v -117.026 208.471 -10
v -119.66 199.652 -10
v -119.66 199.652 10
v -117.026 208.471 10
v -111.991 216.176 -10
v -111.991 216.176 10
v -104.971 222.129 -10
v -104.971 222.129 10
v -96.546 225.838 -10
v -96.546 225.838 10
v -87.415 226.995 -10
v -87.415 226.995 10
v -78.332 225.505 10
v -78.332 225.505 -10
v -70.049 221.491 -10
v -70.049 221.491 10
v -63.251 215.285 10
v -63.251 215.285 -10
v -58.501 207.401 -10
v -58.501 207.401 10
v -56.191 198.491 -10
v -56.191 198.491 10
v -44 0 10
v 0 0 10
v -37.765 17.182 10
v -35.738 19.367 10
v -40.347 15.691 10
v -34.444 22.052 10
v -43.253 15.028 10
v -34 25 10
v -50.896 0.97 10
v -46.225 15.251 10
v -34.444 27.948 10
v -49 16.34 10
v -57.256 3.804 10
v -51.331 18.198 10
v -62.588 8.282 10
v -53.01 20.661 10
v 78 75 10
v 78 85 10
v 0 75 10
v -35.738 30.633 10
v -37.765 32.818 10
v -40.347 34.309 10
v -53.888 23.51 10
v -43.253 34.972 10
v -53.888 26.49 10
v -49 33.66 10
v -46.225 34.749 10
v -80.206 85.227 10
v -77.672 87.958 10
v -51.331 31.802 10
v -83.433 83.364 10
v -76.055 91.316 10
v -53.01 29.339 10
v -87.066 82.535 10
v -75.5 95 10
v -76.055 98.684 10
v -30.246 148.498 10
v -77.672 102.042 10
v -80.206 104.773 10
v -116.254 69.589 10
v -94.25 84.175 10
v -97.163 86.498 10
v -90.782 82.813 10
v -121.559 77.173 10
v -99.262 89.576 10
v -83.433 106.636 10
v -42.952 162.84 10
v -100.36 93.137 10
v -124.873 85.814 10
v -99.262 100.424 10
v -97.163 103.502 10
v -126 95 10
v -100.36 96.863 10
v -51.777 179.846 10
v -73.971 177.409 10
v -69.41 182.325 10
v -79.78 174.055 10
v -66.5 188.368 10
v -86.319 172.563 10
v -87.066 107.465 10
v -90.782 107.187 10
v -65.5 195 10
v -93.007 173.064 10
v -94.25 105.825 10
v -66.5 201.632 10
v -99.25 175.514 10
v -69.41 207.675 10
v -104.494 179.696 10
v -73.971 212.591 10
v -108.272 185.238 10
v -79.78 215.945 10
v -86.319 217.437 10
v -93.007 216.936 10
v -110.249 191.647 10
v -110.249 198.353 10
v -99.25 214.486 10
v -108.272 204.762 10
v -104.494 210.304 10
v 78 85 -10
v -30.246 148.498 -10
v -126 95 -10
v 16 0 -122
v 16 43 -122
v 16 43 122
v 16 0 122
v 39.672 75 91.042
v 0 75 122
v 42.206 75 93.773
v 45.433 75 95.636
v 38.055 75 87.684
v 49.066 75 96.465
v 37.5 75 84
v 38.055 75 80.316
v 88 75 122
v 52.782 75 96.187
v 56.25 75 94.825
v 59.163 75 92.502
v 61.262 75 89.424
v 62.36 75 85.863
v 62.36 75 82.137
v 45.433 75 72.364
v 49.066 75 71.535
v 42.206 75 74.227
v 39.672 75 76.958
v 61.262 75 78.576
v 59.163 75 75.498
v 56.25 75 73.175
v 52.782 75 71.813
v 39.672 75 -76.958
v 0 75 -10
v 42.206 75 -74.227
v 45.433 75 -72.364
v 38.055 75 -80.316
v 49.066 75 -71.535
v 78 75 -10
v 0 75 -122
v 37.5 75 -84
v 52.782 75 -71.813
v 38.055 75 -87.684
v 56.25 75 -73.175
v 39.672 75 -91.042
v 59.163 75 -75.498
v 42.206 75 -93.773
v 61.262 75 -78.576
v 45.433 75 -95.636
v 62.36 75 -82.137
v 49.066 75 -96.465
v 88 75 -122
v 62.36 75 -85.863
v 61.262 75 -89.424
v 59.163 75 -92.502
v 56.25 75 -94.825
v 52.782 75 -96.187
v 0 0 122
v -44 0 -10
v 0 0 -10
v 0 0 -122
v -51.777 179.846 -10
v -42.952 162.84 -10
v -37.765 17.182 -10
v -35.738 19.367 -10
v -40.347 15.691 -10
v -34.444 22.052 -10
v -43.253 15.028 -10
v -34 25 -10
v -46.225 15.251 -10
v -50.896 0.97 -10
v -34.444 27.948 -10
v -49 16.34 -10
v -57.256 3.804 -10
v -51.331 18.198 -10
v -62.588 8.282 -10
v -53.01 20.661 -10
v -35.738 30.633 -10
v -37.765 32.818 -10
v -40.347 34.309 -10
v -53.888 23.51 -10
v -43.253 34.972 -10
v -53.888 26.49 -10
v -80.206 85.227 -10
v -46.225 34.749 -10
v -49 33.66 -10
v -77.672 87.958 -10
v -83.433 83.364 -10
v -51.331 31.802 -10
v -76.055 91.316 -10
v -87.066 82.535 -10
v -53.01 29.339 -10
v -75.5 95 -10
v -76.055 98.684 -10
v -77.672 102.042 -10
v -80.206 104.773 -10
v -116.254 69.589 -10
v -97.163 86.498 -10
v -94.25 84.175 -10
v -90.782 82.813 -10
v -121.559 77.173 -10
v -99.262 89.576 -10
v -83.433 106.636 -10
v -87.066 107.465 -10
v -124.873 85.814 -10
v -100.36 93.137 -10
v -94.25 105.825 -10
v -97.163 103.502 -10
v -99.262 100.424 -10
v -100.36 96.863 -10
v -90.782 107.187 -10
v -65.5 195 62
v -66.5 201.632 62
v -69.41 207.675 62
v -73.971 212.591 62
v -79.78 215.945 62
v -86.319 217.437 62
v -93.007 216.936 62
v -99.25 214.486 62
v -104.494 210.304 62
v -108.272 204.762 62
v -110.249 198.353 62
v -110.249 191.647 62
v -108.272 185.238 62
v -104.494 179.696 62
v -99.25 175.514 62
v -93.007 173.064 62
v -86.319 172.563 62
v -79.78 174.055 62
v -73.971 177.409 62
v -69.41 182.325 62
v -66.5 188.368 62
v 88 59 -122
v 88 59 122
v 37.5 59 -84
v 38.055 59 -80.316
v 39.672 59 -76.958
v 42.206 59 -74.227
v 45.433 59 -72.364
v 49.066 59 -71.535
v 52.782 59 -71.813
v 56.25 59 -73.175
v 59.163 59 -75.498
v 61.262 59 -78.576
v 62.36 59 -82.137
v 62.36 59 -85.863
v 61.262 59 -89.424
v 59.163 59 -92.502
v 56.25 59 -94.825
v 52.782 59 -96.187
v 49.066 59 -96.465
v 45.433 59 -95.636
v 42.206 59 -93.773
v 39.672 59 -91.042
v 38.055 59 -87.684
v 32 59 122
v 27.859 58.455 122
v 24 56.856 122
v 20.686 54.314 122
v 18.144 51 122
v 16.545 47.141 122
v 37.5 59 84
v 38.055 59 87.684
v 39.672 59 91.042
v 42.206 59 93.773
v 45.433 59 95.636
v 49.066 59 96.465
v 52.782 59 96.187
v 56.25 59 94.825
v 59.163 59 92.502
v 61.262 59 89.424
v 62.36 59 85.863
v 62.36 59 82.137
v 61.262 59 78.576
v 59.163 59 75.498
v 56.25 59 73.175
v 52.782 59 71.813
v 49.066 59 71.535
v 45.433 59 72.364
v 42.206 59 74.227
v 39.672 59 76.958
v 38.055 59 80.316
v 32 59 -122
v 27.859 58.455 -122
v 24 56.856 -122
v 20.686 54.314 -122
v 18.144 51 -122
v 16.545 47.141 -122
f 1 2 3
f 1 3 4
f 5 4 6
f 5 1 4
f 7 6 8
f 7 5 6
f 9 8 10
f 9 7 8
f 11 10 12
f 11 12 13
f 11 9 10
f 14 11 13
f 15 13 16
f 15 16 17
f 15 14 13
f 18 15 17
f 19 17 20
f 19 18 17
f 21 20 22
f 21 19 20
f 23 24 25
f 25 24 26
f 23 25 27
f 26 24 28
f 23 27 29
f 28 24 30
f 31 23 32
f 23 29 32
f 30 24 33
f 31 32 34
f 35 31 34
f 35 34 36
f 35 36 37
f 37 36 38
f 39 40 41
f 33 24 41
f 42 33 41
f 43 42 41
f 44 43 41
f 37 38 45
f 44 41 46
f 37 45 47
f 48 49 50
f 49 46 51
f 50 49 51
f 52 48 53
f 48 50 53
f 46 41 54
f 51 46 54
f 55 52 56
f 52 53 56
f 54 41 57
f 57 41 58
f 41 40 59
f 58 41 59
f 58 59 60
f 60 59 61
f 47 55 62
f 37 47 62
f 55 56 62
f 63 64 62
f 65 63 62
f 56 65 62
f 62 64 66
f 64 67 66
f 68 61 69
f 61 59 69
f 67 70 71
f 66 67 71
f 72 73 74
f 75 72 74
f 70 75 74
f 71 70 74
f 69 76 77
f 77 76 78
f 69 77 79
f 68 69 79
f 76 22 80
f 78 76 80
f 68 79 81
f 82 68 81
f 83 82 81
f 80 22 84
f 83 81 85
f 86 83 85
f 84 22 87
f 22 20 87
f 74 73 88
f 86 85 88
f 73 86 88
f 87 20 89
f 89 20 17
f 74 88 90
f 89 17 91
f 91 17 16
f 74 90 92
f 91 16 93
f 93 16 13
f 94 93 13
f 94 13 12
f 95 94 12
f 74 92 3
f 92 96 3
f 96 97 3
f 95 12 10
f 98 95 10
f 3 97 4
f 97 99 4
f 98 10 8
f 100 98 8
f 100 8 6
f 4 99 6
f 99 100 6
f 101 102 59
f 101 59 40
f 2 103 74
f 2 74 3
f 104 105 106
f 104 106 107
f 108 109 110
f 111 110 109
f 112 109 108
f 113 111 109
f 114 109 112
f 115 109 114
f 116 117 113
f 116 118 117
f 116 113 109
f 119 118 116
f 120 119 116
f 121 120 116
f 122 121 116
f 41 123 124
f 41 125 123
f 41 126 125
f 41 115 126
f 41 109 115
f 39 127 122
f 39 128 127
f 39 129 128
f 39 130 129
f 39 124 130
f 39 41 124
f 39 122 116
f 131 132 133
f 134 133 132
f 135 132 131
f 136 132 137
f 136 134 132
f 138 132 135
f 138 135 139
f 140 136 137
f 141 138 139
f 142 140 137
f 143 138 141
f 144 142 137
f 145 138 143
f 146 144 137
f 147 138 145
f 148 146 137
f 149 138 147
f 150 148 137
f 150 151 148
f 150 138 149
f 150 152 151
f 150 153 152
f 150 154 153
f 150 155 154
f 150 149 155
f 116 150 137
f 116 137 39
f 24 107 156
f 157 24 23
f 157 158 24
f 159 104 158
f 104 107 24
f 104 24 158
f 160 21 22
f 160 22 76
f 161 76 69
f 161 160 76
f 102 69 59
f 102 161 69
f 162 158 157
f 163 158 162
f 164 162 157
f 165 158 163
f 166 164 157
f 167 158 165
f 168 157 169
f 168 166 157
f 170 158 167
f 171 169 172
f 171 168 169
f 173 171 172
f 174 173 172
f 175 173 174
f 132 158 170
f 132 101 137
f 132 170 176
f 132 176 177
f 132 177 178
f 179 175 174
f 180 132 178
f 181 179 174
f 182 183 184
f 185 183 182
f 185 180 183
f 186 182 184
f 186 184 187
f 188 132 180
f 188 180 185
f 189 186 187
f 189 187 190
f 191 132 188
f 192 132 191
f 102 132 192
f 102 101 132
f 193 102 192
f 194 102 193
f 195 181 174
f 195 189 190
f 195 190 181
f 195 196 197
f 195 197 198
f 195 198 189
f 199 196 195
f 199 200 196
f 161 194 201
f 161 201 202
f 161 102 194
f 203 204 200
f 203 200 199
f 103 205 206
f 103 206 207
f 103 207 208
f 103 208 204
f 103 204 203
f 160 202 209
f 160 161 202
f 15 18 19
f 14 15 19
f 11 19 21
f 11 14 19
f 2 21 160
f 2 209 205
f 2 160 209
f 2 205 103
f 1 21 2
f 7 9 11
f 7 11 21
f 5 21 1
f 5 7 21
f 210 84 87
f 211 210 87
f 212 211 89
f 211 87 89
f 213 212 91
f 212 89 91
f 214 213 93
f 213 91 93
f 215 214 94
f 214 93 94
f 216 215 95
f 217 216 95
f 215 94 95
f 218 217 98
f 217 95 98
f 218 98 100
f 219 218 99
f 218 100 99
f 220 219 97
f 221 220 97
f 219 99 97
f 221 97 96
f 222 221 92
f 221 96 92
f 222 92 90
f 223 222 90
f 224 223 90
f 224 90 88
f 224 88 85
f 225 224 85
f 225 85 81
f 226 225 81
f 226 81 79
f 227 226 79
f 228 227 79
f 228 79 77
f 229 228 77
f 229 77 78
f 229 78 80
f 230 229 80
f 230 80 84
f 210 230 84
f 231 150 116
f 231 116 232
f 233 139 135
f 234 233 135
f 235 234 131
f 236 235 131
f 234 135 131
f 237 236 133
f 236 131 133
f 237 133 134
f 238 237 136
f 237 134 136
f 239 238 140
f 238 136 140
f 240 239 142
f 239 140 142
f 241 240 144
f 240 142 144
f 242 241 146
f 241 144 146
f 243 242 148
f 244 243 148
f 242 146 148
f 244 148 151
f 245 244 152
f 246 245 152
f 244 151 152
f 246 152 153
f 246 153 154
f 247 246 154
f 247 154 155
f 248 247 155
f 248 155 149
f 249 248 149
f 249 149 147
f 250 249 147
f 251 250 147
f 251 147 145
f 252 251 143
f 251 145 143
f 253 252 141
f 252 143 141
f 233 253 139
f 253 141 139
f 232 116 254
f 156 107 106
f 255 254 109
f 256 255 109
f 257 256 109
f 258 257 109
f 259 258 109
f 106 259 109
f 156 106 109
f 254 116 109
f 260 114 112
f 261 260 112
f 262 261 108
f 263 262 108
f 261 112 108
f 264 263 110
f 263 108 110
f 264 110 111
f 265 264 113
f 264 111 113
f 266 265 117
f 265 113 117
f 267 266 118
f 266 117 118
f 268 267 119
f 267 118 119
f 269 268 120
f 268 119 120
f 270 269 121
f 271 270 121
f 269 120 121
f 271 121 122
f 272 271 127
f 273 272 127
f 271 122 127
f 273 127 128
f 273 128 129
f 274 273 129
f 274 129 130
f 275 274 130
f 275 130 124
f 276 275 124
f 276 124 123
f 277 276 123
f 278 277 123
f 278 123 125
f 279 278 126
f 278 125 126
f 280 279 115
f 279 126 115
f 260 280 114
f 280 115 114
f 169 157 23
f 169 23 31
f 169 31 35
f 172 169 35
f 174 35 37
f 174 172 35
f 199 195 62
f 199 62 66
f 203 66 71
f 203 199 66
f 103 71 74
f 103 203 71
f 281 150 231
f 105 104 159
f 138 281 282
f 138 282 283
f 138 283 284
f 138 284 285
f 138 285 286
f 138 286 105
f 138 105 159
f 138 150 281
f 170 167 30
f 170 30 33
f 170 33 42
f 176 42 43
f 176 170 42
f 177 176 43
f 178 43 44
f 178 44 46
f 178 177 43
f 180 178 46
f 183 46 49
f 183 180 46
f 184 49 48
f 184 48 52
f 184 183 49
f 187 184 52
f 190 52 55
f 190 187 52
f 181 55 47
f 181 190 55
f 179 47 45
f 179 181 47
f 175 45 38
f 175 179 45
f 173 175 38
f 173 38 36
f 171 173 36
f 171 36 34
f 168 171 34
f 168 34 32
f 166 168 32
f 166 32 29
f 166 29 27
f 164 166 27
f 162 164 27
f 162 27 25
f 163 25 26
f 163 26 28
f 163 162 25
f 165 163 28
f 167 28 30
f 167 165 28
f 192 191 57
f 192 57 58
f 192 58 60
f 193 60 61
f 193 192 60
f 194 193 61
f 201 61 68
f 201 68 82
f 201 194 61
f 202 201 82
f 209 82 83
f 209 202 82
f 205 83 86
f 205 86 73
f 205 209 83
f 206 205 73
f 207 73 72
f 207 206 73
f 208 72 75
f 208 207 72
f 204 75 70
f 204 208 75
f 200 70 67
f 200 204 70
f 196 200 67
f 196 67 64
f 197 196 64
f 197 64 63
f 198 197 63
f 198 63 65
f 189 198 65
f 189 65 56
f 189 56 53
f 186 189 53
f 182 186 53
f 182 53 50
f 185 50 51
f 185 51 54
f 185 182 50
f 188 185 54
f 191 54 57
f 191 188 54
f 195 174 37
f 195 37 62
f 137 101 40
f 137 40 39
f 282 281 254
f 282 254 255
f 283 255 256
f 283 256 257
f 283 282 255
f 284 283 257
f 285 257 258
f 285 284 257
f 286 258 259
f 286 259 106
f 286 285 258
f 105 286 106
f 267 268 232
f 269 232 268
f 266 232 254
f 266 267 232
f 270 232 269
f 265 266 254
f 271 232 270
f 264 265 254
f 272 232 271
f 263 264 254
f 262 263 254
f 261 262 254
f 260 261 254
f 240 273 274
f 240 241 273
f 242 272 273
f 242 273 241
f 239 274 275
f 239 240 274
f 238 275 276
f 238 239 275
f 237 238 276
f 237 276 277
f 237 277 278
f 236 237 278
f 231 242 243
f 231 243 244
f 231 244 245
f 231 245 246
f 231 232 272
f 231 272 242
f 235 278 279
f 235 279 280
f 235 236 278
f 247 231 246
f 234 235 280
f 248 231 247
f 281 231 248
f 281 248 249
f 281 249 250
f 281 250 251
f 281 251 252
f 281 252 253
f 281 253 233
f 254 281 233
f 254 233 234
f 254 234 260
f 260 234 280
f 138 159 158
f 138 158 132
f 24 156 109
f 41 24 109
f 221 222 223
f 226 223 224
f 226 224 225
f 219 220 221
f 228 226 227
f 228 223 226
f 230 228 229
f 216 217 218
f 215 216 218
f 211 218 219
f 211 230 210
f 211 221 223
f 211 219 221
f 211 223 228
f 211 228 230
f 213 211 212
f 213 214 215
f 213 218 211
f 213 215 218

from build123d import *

# Parameters (mm, degrees)
SKETCH8_R                 = 22.5
BOSS_EXTRUDE14_DEPTH      = 62
BOSS_EXTRUDE15_DEPTH      = 10
BOSS_EXTRUDE15_DEPTH_BACK = 10
SKETCH2_R                 = 10
SKETCH2_R_2               = 12.5
BOSS_EXTRUDE16_DEPTH      = 122
BOSS_EXTRUDE16_DEPTH_BACK = 122
SKETCH9_R                 = 12.5
CUT_EXTRUDE1_DEPTH        = 16


with BuildPart() as part:
    # Sketch8 → Boss-Extrude14 (new body)
    with BuildSketch(Plane.XY):
        with Locations((-88, 195)):
            Circle(SKETCH8_R)
    extrude(amount=BOSS_EXTRUDE14_DEPTH)

    # Sketch2 → Boss-Extrude15 (add, two sides: drawn at the far end of the back side and taken through both)
    with BuildSketch(Plane.XY.offset(-BOSS_EXTRUDE15_DEPTH_BACK)):
        with BuildLine():
            Line((-44, 0), (0, 0))
            Line((0, 0), (0, 75))
            Line((0, 75), (78, 75))
            Line((78, 75), (78, 85))
            Line((78, 85), (-30.246353585, 148.497970332))
            ThreePointArc((-30.246353585, 148.497970332), (-47.888697043, 171.070854158), (-56.190983138, 198.490909091))
            ThreePointArc((-56.190983138, 198.490909091), (-87.414850516, 226.994649554), (-119.660096955, 199.651694401))
            Line((-119.660096955, 199.651694401), (-126, 95))
            ThreePointArc((-126, 95), (-123.479967643, 81.392211935), (-116.254110736, 69.589269461))
            Line((-116.254110736, 69.589269461), (-62.588230747, 8.282414119))
            ThreePointArc((-62.588230747, 8.282414119), (-54.17497796, 2.164286227), (-44, 0))
        make_face()
        with Locations((-44, 25)):
            Circle(SKETCH2_R, mode=Mode.SUBTRACT)
        with Locations((-88, 95)):
            Circle(SKETCH2_R_2, mode=Mode.SUBTRACT)
    extrude(amount=BOSS_EXTRUDE15_DEPTH + BOSS_EXTRUDE15_DEPTH_BACK)

    # Sketch3 → Boss-Extrude16 (add, two sides: drawn at the far end of the back side and taken through both)
    with BuildSketch(Plane.XY.offset(-BOSS_EXTRUDE16_DEPTH_BACK)):
        with BuildLine():
            Line((0, 0), (0, 75))
            Line((0, 75), (78, 75))
            Line((78, 75), (88, 75))
            Line((88, 75), (88, 59))
            Line((88, 59), (32, 59))
            ThreePointArc((32, 59), (20.686291501, 54.313708499), (16, 43))
            Line((16, 43), (16, 0))
            Line((16, 0), (0, 0))
        make_face()
    extrude(amount=BOSS_EXTRUDE16_DEPTH + BOSS_EXTRUDE16_DEPTH_BACK)

    # Sketch9 → Cut-Extrude1 (cut)
    with BuildSketch(Plane(origin=(0, 75, 0), x_dir=(1, 0, 0), z_dir=(0, 1, 0))):
        with Locations((50, -84)):
            Circle(SKETCH9_R)
        with Locations((50, 84)):
            Circle(SKETCH9_R)
    extrude(amount=-CUT_EXTRUDE1_DEPTH, mode=Mode.SUBTRACT)


solid = part.part
